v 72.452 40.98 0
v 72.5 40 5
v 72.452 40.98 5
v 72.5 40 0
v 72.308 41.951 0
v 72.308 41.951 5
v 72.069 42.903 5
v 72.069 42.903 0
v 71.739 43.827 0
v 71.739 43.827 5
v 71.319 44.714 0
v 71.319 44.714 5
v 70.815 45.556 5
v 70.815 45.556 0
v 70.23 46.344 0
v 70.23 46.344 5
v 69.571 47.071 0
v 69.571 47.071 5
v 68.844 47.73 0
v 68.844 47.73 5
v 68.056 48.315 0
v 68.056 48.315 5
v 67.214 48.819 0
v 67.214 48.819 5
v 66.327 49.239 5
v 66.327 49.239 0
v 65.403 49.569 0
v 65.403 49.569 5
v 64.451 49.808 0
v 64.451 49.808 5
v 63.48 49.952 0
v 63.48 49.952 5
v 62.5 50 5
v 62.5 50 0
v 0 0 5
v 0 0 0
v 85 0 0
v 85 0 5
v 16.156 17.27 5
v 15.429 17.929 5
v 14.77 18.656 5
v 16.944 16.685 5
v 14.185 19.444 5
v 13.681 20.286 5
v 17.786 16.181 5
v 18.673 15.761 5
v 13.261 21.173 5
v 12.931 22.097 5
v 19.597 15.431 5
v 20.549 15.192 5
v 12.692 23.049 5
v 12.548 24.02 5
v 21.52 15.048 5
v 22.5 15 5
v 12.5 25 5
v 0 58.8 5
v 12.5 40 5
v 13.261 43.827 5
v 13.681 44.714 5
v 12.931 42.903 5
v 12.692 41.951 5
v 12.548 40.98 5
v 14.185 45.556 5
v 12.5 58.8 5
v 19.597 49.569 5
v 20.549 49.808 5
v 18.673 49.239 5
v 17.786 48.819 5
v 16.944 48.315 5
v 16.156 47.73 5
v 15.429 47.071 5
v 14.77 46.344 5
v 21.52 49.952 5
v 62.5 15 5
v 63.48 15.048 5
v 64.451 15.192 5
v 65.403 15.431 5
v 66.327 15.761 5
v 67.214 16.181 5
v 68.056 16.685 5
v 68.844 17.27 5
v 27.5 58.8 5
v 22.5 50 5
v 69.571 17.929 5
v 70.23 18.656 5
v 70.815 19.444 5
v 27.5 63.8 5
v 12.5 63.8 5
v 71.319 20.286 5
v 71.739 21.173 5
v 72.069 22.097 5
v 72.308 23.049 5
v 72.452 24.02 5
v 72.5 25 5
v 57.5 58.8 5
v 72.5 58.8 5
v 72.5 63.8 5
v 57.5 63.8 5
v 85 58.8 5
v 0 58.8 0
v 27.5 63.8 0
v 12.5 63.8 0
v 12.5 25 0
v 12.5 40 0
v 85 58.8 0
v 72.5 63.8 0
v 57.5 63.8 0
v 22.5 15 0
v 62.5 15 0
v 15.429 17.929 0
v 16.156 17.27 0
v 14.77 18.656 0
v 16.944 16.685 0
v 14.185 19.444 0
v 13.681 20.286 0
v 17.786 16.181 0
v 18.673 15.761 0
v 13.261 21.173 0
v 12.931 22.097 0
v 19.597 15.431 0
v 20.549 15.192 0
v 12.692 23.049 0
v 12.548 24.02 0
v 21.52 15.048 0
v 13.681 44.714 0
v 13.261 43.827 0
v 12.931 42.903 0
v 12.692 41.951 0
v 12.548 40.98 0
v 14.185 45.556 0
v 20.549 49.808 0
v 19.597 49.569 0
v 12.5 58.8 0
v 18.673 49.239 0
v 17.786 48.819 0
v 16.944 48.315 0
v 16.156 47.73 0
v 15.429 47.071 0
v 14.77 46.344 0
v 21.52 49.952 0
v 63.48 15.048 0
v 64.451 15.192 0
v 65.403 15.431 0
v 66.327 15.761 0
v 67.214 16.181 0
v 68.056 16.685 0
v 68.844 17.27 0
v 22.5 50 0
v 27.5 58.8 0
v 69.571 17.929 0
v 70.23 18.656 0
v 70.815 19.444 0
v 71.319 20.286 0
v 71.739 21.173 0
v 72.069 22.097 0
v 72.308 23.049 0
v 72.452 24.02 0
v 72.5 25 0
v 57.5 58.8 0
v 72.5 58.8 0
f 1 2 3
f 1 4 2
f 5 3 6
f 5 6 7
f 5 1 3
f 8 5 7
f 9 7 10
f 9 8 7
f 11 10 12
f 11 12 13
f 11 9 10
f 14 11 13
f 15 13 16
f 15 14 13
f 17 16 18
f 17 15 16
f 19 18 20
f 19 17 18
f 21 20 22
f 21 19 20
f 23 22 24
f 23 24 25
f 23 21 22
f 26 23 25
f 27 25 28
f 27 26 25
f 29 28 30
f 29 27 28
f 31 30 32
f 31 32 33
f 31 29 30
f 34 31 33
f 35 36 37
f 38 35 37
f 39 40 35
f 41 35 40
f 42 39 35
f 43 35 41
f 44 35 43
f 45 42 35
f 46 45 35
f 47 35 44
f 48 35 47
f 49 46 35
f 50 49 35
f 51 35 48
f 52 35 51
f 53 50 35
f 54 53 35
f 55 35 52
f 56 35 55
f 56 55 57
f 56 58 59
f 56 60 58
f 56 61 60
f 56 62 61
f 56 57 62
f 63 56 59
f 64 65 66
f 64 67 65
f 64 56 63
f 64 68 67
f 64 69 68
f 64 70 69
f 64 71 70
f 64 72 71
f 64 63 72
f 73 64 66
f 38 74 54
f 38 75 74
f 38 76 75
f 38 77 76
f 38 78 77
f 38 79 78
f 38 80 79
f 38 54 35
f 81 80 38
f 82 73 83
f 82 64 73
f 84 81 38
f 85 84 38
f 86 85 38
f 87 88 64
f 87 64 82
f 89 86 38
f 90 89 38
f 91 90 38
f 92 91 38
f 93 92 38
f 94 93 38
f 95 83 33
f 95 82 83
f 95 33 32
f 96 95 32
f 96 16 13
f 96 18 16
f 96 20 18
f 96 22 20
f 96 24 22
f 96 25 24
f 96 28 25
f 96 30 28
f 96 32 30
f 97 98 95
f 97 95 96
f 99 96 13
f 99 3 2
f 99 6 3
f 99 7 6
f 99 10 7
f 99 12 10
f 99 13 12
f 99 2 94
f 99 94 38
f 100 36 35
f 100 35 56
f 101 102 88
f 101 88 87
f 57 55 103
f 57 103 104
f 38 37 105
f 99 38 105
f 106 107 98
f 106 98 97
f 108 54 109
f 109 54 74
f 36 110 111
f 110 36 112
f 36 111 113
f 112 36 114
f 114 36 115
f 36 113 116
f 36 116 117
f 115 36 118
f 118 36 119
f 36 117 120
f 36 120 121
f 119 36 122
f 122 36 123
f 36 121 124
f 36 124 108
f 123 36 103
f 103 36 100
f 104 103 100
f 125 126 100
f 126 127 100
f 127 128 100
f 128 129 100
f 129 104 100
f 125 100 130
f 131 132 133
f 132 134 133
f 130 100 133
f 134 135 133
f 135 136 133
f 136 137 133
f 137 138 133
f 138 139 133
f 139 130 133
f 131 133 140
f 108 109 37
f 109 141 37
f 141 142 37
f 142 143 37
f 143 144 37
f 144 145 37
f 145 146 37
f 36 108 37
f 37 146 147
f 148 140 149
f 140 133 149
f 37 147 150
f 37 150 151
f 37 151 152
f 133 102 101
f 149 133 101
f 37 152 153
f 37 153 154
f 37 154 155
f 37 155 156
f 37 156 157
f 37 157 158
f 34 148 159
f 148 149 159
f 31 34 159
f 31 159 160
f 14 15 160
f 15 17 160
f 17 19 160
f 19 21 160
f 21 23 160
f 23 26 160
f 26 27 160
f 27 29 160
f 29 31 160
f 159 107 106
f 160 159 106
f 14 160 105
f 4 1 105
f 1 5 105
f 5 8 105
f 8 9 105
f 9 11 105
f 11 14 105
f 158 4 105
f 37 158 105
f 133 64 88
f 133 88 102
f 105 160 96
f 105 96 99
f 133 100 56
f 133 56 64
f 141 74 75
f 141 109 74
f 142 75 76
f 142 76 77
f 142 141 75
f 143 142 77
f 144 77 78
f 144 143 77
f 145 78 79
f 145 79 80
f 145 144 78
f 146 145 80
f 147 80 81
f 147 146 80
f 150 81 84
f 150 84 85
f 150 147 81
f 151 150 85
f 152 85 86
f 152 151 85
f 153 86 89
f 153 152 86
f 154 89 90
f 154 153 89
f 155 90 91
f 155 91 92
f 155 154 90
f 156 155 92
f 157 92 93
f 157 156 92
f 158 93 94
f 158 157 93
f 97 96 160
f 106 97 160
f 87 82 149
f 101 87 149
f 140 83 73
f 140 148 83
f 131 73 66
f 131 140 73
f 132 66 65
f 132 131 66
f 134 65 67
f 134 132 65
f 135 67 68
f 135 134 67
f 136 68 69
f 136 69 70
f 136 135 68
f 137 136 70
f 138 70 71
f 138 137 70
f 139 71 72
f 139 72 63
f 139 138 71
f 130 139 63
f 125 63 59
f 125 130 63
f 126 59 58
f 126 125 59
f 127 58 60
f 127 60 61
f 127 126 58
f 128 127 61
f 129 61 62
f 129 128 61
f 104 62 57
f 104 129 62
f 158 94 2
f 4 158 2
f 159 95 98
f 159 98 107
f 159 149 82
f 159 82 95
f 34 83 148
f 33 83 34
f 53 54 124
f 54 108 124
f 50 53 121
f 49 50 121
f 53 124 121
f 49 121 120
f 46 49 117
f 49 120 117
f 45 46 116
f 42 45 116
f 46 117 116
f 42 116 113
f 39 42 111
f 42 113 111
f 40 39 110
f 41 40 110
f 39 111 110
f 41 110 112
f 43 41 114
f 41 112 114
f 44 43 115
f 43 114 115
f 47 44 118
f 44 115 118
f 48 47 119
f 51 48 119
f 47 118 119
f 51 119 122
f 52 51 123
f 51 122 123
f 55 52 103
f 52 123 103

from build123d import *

# Parameters (mm, degrees)
SKIZZE1_W                       = 85
SKIZZE1_H                       = 58.8
AUFSATZ_LINEAR_AUSTRAGEN1_DEPTH = 5
SKIZZE2_W                       = 60
SKIZZE2_H                       = 35
SCHNITT_LINEAR_AUSTRAGEN1_DEPTH = 104.476760676
VERRUNDUNG1_R                   = 10
SKIZZE3_W                       = 15
SKIZZE3_H                       = 5
AUFSATZ_LINEAR_AUSTRAGEN2_DEPTH = 5


with BuildPart() as part:
    # Skizze1 → Aufsatz-Linear austragen1 (new body)
    with BuildSketch(Plane.XY):
        with Locations((42.5, 29.4)):
            Rectangle(SKIZZE1_W, SKIZZE1_H)
    extrude(amount=AUFSATZ_LINEAR_AUSTRAGEN1_DEPTH)

    # Skizze2 → Schnitt-Linear austragen1 (cut, through all)
    with BuildSketch(Plane.XY.offset(5)):
        with Locations((42.5, 32.5)):
            Rectangle(SKIZZE2_W, SKIZZE2_H)
    extrude(amount=-SCHNITT_LINEAR_AUSTRAGEN1_DEPTH, mode=Mode.SUBTRACT)

    # Verrundung1
    verrundung1_edges = [part.edges().sort_by_distance(p)[0] for p in [
        (12.5, 15, 2.5),
        (12.5, 50, 2.5),
        (72.5, 50, 2.5),
        (72.5, 15, 2.5),
    ]]
    fillet(verrundung1_edges, radius=VERRUNDUNG1_R)

    # Skizze3 → Aufsatz-Linear austragen2 (add)
    with BuildSketch(Plane(origin=(0, 58.8, 0), x_dir=(1, 0, 0), z_dir=(0, 1, 0))):
        with Locations((65, -2.5)):
            Rectangle(SKIZZE3_W, SKIZZE3_H)
        with Locations((20, -2.5)):
            Rectangle(SKIZZE3_W, SKIZZE3_H)
    extrude(amount=AUFSATZ_LINEAR_AUSTRAGEN2_DEPTH)


solid = part.part
